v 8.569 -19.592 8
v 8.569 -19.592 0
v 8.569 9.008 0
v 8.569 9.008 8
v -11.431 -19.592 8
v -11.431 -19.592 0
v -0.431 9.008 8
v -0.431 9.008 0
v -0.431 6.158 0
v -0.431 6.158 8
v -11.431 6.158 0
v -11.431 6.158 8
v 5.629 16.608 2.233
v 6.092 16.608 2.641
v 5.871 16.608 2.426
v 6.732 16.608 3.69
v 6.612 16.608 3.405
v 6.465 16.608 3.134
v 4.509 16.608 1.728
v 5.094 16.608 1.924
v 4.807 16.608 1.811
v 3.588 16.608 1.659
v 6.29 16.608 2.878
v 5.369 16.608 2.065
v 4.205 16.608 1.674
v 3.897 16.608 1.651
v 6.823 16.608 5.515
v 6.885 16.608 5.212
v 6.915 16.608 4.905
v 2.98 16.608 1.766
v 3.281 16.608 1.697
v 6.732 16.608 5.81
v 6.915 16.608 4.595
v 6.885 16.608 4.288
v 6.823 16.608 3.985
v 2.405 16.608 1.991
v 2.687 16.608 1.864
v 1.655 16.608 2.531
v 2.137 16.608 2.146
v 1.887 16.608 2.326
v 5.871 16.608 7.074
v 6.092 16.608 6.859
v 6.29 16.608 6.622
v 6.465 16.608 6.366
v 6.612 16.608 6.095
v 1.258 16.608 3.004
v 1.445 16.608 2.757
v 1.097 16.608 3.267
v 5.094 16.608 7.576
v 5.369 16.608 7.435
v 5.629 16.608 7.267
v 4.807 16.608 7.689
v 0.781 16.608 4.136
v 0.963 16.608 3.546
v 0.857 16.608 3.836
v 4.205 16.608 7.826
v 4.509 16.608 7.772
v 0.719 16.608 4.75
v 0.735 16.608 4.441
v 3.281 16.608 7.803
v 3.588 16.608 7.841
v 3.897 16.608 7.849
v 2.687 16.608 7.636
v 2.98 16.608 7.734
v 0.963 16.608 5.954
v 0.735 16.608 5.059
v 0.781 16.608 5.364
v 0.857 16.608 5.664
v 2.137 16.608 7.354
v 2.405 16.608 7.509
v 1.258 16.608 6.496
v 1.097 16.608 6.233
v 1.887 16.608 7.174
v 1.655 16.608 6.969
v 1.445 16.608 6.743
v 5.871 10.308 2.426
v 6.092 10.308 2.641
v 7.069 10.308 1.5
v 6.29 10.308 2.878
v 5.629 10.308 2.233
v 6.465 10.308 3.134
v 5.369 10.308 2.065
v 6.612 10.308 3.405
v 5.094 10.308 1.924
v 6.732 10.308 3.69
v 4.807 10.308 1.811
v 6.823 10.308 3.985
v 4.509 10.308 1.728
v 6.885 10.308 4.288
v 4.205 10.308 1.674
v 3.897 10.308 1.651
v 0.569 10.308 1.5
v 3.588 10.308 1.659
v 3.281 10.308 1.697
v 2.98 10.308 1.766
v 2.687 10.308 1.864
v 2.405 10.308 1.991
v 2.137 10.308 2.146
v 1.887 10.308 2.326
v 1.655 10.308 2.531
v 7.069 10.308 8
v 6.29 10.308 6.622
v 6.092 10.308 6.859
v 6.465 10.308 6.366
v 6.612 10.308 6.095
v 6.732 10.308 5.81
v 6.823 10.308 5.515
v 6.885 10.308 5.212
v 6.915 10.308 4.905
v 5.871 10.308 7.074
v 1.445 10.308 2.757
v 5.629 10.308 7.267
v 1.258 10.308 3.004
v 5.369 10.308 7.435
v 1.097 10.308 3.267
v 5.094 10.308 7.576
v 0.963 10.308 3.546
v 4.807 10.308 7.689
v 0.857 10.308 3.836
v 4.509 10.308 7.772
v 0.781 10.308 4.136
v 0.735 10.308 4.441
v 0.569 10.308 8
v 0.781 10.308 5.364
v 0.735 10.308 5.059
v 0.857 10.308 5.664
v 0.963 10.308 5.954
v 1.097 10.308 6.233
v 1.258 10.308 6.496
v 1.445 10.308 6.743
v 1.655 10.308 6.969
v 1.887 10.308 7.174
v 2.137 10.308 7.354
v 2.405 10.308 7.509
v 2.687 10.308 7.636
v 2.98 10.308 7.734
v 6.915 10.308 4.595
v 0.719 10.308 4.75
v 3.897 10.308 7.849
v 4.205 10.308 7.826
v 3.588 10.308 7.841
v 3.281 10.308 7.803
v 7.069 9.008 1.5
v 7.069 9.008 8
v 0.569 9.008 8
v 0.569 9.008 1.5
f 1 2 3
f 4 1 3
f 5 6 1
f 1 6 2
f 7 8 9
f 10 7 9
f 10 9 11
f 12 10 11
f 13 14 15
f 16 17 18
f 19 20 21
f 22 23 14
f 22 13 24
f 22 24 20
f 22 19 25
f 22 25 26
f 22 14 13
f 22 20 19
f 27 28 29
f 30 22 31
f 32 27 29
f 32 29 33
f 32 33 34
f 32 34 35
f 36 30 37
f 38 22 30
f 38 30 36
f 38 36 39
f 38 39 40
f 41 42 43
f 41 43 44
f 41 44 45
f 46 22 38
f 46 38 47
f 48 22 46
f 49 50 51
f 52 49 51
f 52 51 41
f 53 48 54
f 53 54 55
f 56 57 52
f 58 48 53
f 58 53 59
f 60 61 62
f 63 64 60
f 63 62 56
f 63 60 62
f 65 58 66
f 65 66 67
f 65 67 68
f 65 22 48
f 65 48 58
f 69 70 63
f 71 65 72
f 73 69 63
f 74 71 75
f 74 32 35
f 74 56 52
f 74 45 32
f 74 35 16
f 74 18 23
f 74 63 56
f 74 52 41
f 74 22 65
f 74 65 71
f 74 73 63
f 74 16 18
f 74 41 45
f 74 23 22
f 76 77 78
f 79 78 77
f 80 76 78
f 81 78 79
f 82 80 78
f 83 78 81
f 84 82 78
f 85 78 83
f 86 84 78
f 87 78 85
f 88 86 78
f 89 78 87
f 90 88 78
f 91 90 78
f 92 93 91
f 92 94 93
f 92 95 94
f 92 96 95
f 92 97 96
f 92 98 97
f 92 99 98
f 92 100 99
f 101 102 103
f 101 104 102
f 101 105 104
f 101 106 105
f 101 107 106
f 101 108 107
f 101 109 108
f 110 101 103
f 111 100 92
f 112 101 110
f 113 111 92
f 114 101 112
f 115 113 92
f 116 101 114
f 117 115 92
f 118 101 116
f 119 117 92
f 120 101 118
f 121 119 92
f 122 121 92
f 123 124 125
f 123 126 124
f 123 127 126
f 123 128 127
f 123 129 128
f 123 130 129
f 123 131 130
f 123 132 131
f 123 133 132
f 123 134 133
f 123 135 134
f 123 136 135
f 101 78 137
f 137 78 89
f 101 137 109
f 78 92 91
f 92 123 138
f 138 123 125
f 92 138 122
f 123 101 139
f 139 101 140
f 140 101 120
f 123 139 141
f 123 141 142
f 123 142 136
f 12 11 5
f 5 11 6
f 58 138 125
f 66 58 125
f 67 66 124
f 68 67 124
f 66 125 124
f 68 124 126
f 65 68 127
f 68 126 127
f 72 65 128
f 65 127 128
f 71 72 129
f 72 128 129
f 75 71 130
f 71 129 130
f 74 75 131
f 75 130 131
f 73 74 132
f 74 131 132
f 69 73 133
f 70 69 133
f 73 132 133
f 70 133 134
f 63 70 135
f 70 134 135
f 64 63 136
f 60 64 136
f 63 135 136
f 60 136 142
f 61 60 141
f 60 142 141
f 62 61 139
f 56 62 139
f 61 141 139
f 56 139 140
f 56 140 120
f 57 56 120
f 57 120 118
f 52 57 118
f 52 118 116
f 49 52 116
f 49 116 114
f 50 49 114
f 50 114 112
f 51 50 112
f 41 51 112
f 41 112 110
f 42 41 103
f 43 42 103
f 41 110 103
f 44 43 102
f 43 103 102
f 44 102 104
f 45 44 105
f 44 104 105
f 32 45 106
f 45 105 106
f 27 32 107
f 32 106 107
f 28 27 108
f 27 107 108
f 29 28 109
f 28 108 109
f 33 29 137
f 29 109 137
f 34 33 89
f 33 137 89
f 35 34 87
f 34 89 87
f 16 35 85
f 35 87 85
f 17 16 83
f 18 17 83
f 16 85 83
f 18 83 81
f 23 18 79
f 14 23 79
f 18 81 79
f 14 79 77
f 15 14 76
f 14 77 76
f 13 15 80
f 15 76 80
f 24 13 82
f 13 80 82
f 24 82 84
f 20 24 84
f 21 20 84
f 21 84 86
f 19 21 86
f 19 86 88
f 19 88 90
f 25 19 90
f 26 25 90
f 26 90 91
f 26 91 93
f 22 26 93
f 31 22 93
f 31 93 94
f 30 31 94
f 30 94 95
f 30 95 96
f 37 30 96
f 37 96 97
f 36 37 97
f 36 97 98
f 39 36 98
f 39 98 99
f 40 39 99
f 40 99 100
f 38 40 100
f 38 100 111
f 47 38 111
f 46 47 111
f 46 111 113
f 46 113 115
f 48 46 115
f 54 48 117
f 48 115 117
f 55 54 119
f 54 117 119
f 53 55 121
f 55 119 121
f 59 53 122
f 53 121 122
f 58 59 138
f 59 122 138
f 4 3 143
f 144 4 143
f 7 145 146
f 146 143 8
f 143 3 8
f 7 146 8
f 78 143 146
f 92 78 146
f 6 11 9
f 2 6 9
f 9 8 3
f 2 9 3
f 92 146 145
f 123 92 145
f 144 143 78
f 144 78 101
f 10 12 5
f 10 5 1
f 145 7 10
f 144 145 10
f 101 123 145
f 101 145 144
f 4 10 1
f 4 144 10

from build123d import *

# Parameters (mm, degrees)
F1_DEPTH = 8
F2_W     = 6.5
F2_H     = 6.5
F3_DEPTH = 1.3
F4_R     = 3.1
F5_DEPTH = 6.3


with BuildPart() as f1:
    # F0 (on Top) → F1 (new body)
    with BuildSketch(Plane.XY):
        Polygon((-0.430666, 6.157663), (-11.430666, 6.157663), (-11.430666, -19.592337), (8.569334, -19.592337), (8.569334, 6.157663), (8.569334, 9.007663), (-0.430666, 9.007663), align=None)
    extrude(amount=F1_DEPTH)

    # F2 (on face) → F3 (join)
    with BuildSketch(Plane(origin=(0, 9.007663, 0), x_dir=(-1, 0, 0), z_dir=(0, 1, 0))):
        with Locations((-3.819334, 4.75)):
            Rectangle(F2_W, F2_H)
    extrude(amount=F3_DEPTH)

    # F4 (on face) → F5 (join)
    with BuildSketch(Plane(origin=(0, 10.307663, 0), x_dir=(-1, 0, 0), z_dir=(0, 1, 0))):
        with Locations((-3.819334, 4.75)):
            Circle(F4_R)
    extrude(amount=F5_DEPTH)


solid = f1.part
